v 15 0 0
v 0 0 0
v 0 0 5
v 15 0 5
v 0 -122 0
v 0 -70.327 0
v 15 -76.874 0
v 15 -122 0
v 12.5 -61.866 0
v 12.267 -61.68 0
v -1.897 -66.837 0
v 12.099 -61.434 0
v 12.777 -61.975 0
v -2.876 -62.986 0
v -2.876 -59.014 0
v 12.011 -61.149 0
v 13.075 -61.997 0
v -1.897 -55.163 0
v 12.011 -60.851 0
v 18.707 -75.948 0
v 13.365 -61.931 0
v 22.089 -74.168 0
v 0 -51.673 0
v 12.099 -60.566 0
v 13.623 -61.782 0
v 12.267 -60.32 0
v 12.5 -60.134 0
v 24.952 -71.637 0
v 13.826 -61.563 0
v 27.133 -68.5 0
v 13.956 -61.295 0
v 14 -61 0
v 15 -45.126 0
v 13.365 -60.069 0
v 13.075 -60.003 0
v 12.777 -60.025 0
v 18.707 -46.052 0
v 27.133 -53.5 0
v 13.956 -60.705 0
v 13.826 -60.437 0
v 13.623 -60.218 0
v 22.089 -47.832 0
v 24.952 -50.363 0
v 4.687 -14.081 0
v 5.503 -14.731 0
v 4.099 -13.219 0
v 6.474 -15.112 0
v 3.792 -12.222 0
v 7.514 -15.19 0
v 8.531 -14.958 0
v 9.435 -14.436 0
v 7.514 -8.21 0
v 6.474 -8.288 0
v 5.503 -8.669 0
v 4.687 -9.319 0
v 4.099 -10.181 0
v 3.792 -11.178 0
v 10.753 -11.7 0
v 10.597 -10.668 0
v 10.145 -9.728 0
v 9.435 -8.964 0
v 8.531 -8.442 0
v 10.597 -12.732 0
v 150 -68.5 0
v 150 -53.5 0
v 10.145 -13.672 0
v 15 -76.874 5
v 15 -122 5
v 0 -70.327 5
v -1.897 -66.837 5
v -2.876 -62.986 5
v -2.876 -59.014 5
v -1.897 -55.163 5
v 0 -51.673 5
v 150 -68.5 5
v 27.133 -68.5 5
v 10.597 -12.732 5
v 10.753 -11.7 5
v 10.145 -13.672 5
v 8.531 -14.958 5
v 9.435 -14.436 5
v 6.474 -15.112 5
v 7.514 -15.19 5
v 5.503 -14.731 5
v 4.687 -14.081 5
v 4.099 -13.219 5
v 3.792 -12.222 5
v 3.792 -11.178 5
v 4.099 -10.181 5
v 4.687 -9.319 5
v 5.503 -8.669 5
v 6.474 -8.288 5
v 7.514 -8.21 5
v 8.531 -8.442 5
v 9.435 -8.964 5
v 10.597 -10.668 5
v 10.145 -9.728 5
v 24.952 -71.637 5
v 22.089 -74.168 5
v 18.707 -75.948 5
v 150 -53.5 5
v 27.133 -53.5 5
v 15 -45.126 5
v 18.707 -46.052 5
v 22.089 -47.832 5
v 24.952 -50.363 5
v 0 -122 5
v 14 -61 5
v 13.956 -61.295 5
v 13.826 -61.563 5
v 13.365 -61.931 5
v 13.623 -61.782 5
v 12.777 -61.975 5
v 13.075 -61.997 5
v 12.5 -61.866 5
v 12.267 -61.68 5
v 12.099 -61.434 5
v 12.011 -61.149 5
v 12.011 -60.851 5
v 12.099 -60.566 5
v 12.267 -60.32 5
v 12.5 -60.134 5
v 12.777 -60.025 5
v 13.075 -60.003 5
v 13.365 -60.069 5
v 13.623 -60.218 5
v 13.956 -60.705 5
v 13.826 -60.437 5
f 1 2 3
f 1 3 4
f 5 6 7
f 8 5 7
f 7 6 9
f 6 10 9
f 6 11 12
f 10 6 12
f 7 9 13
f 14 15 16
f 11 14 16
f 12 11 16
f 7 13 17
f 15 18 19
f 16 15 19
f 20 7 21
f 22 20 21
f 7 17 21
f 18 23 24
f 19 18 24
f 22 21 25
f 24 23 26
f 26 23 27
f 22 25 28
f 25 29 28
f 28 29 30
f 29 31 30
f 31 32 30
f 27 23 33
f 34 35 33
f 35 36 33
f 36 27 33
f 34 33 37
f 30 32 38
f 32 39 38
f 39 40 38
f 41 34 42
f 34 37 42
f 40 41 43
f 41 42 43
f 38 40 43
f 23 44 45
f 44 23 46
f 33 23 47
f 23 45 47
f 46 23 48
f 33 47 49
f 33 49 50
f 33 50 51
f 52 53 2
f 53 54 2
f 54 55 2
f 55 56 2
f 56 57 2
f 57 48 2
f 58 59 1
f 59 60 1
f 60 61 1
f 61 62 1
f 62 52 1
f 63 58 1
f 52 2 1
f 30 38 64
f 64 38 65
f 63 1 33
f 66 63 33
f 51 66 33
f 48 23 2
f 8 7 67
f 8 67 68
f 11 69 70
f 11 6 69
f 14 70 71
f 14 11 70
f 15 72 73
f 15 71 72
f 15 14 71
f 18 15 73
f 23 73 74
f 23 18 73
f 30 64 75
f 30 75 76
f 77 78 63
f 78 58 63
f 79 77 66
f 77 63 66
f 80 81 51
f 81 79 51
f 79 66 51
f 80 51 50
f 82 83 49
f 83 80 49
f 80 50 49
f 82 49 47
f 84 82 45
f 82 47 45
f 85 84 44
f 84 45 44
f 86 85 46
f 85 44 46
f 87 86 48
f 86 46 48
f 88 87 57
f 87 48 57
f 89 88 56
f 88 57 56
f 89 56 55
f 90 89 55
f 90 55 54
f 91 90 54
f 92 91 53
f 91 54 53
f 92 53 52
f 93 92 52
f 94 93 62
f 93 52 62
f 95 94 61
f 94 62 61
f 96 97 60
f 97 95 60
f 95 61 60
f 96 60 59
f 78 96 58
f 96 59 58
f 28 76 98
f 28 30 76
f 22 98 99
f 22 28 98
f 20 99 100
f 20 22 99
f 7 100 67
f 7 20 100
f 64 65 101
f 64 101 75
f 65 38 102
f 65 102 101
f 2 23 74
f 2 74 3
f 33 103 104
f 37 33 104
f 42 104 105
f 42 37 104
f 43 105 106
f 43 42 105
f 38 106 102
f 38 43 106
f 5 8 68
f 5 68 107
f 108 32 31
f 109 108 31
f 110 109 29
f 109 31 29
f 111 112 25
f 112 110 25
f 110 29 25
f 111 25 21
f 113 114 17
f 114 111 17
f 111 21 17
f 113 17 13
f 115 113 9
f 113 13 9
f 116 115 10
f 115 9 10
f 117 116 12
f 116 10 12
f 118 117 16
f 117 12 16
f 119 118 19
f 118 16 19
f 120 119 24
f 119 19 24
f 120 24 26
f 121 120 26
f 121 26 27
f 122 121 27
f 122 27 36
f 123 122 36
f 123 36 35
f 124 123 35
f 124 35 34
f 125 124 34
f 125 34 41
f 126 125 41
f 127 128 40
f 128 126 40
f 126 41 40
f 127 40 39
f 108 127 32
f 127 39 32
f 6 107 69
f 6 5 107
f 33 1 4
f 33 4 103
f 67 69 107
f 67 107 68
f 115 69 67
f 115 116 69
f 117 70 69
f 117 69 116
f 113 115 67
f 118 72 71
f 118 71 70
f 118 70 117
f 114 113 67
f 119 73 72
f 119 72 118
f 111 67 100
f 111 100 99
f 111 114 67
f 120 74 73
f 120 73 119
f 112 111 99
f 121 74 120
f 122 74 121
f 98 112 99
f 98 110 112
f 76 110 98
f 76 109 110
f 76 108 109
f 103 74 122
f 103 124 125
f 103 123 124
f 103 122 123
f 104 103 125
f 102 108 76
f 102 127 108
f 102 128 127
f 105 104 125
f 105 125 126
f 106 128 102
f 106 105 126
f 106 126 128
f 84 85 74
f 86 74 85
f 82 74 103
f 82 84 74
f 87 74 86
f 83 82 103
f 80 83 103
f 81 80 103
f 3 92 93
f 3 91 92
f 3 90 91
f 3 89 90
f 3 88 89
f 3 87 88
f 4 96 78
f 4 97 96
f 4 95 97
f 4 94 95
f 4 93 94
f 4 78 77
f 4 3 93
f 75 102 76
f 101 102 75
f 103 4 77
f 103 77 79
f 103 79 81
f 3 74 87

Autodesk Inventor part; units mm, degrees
ref_plane "YZ Plane" through (0, 0, 0) normal (1, 0, 0) x (0, 1, 0)
ref_plane "XZ Plane" through (0, 0, 0) normal (0, 1, 0) x (-1, 0, 0)
ref_plane "XY Plane" through (0, 0, 0) normal (0, 0, 1) x (1, 0, 0)
sketch "Boceto1" plane through (0, 0, 0) normal (0, 0, 1) x (1, 0, 0)
  line L0 (0, -51.6726) -> (0, 0)
  line L1 (0, 0) -> (15, 0)
  line L2 (15, 0) -> (15, -45.1255)
  circle A0 centre (7.2527, -11.7) radius 3.5
  arc A1 (0, -51.6726) -> (0, -70.3274) centre (13, -61) ccw
  line L3 (27.1333, -53.5) -> (150, -53.5)
  line L4 (150, -53.5) -> (150, -68.5)
  line L5 (150, -68.5) -> (27.1333, -68.5)
  line L6 (15, -76.8745) -> (15, -122)
  line L7 (15, -122) -> (0, -122)
  line L8 (0, -122) -> (0, -70.3274)
  arc A2 (15, -76.8745) -> (27.1333, -68.5) centre (13, -61) ccw
  arc A3 (27.1333, -53.5) -> (15, -45.1255) centre (13, -61) ccw
  circle A4 centre (13, -61) radius 1
  point P0 (0, -70.3274)
  point P1 (15, -76.8745)
  dimension "d0" = 2
extrude "Extrusión1" add sketch "Boceto1" along normal blind 5
properties part number "P3"
